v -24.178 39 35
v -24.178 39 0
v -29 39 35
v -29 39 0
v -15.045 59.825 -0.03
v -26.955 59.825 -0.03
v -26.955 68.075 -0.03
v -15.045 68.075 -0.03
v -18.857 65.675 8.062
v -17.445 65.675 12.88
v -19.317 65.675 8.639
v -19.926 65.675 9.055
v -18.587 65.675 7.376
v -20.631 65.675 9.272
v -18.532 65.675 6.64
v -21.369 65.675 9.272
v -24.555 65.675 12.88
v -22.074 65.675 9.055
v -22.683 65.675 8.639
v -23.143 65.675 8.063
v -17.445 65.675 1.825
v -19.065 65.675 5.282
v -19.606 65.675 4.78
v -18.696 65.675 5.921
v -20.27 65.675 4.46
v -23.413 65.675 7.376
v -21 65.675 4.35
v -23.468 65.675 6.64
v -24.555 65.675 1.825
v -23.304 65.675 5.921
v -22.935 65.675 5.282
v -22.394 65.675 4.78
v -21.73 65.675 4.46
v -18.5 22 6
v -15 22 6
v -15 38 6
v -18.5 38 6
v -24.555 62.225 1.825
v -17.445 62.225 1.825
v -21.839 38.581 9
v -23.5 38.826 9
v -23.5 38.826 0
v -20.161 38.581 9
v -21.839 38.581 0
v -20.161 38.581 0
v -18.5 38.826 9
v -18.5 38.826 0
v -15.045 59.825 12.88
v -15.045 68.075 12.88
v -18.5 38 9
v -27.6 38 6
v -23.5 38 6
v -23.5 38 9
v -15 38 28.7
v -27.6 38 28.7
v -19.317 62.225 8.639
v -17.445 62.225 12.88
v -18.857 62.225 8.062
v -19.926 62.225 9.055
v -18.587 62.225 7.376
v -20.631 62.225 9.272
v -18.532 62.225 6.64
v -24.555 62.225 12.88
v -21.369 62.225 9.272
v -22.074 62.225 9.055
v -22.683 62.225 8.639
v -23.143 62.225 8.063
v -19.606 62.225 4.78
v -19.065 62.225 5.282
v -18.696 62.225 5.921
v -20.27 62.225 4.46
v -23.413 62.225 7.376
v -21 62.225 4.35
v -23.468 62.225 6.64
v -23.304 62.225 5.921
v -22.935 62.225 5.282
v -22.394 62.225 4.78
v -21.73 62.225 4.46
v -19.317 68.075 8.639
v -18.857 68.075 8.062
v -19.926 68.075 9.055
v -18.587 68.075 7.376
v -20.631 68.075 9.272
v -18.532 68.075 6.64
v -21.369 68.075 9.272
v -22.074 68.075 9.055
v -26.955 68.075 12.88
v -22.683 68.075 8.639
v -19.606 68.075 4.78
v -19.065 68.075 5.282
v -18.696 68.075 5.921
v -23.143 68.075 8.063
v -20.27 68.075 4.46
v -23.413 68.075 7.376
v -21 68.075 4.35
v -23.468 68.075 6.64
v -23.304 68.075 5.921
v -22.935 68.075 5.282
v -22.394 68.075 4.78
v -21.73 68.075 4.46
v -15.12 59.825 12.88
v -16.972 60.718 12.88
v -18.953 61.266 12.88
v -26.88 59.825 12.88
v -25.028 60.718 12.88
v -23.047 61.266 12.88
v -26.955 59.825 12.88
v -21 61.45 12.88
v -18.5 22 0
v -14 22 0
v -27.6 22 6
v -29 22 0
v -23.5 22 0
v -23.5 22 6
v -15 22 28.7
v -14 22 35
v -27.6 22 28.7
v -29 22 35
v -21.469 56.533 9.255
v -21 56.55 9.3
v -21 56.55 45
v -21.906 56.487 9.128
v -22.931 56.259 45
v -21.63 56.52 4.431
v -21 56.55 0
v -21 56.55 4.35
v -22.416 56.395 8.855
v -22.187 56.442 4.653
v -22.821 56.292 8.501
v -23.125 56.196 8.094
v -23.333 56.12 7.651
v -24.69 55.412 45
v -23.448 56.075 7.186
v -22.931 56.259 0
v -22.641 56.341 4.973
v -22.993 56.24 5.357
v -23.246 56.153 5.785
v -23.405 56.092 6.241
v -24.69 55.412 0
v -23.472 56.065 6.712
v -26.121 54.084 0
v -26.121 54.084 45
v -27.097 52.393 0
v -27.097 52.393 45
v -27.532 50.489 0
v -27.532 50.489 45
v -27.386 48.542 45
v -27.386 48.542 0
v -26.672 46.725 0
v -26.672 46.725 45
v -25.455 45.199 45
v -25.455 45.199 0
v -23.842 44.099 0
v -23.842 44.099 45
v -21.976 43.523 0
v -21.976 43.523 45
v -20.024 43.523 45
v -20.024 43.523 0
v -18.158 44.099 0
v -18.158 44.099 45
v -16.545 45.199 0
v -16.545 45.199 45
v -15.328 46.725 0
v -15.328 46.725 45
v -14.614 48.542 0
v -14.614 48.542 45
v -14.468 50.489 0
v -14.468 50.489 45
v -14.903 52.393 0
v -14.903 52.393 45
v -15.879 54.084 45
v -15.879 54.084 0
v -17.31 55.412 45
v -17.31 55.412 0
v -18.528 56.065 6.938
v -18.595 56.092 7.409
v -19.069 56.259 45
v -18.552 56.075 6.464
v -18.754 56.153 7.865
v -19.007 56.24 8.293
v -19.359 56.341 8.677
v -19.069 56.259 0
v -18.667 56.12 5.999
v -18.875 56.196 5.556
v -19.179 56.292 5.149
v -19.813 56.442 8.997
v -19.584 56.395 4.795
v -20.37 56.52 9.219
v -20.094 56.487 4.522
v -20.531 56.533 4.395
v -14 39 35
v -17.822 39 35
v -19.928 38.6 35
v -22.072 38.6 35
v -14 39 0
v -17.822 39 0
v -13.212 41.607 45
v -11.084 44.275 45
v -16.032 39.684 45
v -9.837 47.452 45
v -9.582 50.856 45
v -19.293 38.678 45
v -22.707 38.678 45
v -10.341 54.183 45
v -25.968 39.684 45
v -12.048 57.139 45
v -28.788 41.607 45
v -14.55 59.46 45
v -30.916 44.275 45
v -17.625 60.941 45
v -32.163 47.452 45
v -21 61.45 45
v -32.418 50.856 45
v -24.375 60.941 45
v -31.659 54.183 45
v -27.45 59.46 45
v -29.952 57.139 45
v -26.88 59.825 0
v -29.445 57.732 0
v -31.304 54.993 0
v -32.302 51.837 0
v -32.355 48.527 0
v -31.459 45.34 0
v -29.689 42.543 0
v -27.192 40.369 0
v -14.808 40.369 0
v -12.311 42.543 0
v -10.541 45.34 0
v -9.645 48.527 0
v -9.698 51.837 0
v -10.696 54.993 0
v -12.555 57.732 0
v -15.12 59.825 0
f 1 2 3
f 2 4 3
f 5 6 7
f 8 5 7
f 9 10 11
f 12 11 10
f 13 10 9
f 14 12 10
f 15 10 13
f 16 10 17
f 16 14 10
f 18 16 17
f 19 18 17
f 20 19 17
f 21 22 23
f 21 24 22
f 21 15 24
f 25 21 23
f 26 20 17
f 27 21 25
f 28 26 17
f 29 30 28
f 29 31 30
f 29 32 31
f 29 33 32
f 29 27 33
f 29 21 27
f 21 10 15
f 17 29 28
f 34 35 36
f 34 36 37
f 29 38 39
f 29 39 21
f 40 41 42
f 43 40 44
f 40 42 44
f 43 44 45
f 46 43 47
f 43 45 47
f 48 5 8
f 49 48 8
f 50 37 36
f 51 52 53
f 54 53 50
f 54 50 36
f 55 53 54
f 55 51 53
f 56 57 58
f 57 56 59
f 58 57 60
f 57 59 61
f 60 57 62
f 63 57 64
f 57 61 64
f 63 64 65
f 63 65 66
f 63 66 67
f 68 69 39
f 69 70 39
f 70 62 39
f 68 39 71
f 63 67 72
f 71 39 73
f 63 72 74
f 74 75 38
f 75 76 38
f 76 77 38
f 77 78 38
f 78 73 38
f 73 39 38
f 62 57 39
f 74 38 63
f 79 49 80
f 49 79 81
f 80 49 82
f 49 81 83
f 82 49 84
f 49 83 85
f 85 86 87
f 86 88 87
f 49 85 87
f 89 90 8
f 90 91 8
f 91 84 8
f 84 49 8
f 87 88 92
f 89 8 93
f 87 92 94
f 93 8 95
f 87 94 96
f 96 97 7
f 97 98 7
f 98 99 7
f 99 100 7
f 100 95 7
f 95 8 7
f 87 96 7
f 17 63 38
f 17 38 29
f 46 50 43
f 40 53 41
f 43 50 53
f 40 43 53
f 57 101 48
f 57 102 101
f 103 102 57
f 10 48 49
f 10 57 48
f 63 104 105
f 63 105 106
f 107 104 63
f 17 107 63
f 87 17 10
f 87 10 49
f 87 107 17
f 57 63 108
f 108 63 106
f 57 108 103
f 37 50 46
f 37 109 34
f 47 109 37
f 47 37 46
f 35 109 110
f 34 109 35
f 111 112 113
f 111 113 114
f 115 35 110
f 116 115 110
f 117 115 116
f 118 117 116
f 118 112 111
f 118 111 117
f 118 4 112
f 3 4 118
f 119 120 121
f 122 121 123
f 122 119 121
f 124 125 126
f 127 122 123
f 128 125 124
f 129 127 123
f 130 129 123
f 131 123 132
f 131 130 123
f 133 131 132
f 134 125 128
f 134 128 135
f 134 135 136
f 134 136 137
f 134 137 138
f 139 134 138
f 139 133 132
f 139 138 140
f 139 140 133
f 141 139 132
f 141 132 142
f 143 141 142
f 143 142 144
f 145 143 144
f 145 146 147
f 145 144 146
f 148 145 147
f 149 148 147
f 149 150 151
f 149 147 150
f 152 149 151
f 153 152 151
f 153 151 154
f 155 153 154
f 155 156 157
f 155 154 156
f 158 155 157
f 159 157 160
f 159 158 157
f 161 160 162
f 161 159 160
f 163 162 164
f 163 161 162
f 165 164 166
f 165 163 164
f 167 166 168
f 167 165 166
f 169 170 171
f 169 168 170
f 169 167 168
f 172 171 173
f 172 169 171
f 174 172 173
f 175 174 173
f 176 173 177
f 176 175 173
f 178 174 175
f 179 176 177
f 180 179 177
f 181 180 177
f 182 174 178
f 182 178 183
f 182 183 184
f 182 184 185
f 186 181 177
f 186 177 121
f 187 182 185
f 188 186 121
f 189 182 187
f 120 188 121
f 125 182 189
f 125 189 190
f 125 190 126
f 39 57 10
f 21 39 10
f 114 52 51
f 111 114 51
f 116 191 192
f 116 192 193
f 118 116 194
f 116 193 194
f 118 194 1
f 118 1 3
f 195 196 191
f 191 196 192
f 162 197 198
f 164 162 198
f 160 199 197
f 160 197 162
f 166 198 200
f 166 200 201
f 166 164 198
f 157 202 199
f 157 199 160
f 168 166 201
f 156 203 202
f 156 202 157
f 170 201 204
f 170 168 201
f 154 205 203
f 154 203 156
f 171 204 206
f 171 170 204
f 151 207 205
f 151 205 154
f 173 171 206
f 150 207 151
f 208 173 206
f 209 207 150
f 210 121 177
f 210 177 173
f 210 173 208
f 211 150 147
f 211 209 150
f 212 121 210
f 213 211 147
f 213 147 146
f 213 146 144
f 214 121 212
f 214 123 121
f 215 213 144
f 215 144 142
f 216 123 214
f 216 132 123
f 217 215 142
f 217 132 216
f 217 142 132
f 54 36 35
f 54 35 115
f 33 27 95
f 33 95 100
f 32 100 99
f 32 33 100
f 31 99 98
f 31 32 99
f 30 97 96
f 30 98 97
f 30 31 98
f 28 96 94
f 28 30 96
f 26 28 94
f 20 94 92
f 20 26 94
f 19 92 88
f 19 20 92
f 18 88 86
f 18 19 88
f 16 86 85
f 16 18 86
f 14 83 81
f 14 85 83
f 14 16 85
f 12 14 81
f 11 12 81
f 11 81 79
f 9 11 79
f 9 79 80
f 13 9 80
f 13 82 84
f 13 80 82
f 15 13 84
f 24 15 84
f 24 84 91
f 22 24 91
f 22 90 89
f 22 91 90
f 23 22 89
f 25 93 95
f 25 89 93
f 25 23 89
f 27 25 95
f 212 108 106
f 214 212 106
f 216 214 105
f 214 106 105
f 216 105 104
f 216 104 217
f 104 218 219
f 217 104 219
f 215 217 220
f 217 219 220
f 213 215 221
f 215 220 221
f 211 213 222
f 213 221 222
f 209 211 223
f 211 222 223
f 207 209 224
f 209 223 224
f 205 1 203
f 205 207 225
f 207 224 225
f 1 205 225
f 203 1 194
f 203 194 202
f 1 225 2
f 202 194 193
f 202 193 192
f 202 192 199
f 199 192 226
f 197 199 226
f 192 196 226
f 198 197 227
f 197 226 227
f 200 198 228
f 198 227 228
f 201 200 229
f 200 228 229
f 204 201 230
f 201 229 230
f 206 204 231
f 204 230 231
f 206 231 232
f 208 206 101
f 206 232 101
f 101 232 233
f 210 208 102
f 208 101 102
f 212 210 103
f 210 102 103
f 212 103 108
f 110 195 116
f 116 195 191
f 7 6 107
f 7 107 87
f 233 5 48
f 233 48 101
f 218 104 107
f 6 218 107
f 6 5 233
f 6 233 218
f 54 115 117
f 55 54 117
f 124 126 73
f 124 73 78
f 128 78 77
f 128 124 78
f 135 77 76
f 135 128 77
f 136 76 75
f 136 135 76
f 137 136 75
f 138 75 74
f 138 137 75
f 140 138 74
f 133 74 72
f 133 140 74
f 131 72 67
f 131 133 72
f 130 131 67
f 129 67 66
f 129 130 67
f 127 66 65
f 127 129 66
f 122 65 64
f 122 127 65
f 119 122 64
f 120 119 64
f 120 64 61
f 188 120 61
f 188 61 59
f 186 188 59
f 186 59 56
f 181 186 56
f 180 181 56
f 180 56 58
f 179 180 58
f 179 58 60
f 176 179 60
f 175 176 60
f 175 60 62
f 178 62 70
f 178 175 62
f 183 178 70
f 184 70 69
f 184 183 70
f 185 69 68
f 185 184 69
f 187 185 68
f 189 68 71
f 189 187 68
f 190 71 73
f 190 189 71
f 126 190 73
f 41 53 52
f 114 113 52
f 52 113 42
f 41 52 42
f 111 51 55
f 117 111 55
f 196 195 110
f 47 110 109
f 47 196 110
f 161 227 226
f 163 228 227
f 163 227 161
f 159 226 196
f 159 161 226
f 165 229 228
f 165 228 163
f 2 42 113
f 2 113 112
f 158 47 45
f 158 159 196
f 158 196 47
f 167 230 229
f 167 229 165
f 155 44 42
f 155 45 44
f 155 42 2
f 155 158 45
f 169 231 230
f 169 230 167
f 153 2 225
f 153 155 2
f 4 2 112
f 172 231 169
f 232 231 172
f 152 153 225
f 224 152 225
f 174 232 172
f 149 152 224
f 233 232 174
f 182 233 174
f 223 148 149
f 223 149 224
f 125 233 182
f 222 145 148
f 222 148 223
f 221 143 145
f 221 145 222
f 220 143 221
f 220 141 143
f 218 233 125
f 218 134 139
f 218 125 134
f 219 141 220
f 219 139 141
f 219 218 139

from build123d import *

# Parameters (mm, degrees)
BOX002_W               = 20
BOX002_H               = 5
BOX002_DEPTH           = 10
BOX_W                  = 22.7
BOX_H                  = 12.6
BOX_DEPTH              = 17
BOX001_W               = 35
BOX001_H               = 15
BOX001_DEPTH           = 17
CUT_PLACEMENT_ANGLE    = 90
CYLINDER002_R          = 2.475
CYLINDER002_DEPTH      = 22.9
CYLINDER001_R          = 6.55
CYLINDER001_DEPTH      = 50
CUBE001_W              = 3.45
CUBE001_H              = 7.11
CUBE001_DEPTH          = 11.11
CUBE_W                 = 8.25
CUBE_H                 = 11.91
CUBE_DEPTH             = 12.91
CYLINDER_R             = 11.45
CYLINDER_DEPTH         = 45
FUSION_PLACEMENT_ANGLE = 90


with BuildPart() as cube002:
    # Box002 → Box002 (new body)
    with BuildSketch(Plane(origin=(-30, -2.5, -1), x_dir=(1, 0, 0), z_dir=(0, 0, 1))):
        with Locations((10, 2.5)):
            Rectangle(BOX002_W, BOX002_H)
    extrude(amount=BOX002_DEPTH)


with BuildPart() as cube:
    # Box → Box (new body)
    with BuildSketch(Plane.XY.offset(1)):
        with Locations((11.35, 6.3)):
            Rectangle(BOX_W, BOX_H)
    extrude(amount=BOX_DEPTH)


with BuildPart() as cut001:
    # Box001 → Box001 (new body)
    with BuildSketch(Plane(origin=(-6, -1, 0), x_dir=(1, 0, 0), z_dir=(0, 0, 1))):
        with Locations((17.5, 7.5)):
            Rectangle(BOX001_W, BOX001_H)
    extrude(amount=BOX001_DEPTH)

    # Cut: cut Cube
    add(cube.part, mode=Mode.SUBTRACT)


with BuildPart() as cut001_1:
    # Cut placement: moved
    add(cut001.part.moved(Location((-11, -6, 6))).rotate(Axis((-11, -6, 6), (0, -1, 0)), CUT_PLACEMENT_ANGLE))

    # Cut001: cut Cube002
    add(cube002.part, mode=Mode.SUBTRACT)


with BuildPart() as cylinder002:
    # cylinder002 → cylinder002 (new body)
    with BuildSketch(Plane(origin=(0, 0, 6.825), x_dir=(0, 0, -1), z_dir=(1, 0, 0))):
        Circle(CYLINDER002_R)
    extrude(amount=CYLINDER002_DEPTH)


with BuildPart() as union001:
    # cylinder001 → cylinder001 (new body)
    with BuildSketch(Plane.XY.offset(-1)):
        Circle(CYLINDER001_R)
    extrude(amount=CYLINDER001_DEPTH)

    # union001: union cylinder002
    add(cylinder002.part)


with BuildPart() as cube001:
    # cube001 → cube001 (new body)
    with BuildSketch(Plane(origin=(-1.725, -3.555, -4.6), x_dir=(1, 0, 0), z_dir=(0, 0, 1))):
        with Locations((1.725, 3.555)):
            Rectangle(CUBE001_W, CUBE001_H)
    extrude(amount=CUBE001_DEPTH)


with BuildPart() as difference:
    # cube → cube (new body)
    with BuildSketch(Plane(origin=(-4.125, -5.955, -6.455), x_dir=(1, 0, 0), z_dir=(0, 0, 1))):
        with Locations((4.125, 5.955)):
            Rectangle(CUBE_W, CUBE_H)
    extrude(amount=CUBE_DEPTH)

    # difference: cut cube001
    add(cube001.part, mode=Mode.SUBTRACT)


with BuildPart() as difference_1:
    # difference placement: moved
    add(difference.part.moved(Location((13.95, 0, 6.425))))


with BuildPart() as motor_holder:
    # cylinder → cylinder (new body)
    with BuildSketch(Plane.XY):
        Circle(CYLINDER_R)
    extrude(amount=CYLINDER_DEPTH)

    # union: union difference
    add(difference_1.part)

    # difference001: cut union001
    add(union001.part, mode=Mode.SUBTRACT)

    # Fusion: union Cut001
    add(cut001_1.part)


with BuildPart() as motor_holder_1:
    # Fusion placement: moved
    add(motor_holder.part.moved(Location((-21, 50, 0))).rotate(Axis((-21, 50, 0), (0, 0, 1)), FUSION_PLACEMENT_ANGLE))


solid = motor_holder_1.part
